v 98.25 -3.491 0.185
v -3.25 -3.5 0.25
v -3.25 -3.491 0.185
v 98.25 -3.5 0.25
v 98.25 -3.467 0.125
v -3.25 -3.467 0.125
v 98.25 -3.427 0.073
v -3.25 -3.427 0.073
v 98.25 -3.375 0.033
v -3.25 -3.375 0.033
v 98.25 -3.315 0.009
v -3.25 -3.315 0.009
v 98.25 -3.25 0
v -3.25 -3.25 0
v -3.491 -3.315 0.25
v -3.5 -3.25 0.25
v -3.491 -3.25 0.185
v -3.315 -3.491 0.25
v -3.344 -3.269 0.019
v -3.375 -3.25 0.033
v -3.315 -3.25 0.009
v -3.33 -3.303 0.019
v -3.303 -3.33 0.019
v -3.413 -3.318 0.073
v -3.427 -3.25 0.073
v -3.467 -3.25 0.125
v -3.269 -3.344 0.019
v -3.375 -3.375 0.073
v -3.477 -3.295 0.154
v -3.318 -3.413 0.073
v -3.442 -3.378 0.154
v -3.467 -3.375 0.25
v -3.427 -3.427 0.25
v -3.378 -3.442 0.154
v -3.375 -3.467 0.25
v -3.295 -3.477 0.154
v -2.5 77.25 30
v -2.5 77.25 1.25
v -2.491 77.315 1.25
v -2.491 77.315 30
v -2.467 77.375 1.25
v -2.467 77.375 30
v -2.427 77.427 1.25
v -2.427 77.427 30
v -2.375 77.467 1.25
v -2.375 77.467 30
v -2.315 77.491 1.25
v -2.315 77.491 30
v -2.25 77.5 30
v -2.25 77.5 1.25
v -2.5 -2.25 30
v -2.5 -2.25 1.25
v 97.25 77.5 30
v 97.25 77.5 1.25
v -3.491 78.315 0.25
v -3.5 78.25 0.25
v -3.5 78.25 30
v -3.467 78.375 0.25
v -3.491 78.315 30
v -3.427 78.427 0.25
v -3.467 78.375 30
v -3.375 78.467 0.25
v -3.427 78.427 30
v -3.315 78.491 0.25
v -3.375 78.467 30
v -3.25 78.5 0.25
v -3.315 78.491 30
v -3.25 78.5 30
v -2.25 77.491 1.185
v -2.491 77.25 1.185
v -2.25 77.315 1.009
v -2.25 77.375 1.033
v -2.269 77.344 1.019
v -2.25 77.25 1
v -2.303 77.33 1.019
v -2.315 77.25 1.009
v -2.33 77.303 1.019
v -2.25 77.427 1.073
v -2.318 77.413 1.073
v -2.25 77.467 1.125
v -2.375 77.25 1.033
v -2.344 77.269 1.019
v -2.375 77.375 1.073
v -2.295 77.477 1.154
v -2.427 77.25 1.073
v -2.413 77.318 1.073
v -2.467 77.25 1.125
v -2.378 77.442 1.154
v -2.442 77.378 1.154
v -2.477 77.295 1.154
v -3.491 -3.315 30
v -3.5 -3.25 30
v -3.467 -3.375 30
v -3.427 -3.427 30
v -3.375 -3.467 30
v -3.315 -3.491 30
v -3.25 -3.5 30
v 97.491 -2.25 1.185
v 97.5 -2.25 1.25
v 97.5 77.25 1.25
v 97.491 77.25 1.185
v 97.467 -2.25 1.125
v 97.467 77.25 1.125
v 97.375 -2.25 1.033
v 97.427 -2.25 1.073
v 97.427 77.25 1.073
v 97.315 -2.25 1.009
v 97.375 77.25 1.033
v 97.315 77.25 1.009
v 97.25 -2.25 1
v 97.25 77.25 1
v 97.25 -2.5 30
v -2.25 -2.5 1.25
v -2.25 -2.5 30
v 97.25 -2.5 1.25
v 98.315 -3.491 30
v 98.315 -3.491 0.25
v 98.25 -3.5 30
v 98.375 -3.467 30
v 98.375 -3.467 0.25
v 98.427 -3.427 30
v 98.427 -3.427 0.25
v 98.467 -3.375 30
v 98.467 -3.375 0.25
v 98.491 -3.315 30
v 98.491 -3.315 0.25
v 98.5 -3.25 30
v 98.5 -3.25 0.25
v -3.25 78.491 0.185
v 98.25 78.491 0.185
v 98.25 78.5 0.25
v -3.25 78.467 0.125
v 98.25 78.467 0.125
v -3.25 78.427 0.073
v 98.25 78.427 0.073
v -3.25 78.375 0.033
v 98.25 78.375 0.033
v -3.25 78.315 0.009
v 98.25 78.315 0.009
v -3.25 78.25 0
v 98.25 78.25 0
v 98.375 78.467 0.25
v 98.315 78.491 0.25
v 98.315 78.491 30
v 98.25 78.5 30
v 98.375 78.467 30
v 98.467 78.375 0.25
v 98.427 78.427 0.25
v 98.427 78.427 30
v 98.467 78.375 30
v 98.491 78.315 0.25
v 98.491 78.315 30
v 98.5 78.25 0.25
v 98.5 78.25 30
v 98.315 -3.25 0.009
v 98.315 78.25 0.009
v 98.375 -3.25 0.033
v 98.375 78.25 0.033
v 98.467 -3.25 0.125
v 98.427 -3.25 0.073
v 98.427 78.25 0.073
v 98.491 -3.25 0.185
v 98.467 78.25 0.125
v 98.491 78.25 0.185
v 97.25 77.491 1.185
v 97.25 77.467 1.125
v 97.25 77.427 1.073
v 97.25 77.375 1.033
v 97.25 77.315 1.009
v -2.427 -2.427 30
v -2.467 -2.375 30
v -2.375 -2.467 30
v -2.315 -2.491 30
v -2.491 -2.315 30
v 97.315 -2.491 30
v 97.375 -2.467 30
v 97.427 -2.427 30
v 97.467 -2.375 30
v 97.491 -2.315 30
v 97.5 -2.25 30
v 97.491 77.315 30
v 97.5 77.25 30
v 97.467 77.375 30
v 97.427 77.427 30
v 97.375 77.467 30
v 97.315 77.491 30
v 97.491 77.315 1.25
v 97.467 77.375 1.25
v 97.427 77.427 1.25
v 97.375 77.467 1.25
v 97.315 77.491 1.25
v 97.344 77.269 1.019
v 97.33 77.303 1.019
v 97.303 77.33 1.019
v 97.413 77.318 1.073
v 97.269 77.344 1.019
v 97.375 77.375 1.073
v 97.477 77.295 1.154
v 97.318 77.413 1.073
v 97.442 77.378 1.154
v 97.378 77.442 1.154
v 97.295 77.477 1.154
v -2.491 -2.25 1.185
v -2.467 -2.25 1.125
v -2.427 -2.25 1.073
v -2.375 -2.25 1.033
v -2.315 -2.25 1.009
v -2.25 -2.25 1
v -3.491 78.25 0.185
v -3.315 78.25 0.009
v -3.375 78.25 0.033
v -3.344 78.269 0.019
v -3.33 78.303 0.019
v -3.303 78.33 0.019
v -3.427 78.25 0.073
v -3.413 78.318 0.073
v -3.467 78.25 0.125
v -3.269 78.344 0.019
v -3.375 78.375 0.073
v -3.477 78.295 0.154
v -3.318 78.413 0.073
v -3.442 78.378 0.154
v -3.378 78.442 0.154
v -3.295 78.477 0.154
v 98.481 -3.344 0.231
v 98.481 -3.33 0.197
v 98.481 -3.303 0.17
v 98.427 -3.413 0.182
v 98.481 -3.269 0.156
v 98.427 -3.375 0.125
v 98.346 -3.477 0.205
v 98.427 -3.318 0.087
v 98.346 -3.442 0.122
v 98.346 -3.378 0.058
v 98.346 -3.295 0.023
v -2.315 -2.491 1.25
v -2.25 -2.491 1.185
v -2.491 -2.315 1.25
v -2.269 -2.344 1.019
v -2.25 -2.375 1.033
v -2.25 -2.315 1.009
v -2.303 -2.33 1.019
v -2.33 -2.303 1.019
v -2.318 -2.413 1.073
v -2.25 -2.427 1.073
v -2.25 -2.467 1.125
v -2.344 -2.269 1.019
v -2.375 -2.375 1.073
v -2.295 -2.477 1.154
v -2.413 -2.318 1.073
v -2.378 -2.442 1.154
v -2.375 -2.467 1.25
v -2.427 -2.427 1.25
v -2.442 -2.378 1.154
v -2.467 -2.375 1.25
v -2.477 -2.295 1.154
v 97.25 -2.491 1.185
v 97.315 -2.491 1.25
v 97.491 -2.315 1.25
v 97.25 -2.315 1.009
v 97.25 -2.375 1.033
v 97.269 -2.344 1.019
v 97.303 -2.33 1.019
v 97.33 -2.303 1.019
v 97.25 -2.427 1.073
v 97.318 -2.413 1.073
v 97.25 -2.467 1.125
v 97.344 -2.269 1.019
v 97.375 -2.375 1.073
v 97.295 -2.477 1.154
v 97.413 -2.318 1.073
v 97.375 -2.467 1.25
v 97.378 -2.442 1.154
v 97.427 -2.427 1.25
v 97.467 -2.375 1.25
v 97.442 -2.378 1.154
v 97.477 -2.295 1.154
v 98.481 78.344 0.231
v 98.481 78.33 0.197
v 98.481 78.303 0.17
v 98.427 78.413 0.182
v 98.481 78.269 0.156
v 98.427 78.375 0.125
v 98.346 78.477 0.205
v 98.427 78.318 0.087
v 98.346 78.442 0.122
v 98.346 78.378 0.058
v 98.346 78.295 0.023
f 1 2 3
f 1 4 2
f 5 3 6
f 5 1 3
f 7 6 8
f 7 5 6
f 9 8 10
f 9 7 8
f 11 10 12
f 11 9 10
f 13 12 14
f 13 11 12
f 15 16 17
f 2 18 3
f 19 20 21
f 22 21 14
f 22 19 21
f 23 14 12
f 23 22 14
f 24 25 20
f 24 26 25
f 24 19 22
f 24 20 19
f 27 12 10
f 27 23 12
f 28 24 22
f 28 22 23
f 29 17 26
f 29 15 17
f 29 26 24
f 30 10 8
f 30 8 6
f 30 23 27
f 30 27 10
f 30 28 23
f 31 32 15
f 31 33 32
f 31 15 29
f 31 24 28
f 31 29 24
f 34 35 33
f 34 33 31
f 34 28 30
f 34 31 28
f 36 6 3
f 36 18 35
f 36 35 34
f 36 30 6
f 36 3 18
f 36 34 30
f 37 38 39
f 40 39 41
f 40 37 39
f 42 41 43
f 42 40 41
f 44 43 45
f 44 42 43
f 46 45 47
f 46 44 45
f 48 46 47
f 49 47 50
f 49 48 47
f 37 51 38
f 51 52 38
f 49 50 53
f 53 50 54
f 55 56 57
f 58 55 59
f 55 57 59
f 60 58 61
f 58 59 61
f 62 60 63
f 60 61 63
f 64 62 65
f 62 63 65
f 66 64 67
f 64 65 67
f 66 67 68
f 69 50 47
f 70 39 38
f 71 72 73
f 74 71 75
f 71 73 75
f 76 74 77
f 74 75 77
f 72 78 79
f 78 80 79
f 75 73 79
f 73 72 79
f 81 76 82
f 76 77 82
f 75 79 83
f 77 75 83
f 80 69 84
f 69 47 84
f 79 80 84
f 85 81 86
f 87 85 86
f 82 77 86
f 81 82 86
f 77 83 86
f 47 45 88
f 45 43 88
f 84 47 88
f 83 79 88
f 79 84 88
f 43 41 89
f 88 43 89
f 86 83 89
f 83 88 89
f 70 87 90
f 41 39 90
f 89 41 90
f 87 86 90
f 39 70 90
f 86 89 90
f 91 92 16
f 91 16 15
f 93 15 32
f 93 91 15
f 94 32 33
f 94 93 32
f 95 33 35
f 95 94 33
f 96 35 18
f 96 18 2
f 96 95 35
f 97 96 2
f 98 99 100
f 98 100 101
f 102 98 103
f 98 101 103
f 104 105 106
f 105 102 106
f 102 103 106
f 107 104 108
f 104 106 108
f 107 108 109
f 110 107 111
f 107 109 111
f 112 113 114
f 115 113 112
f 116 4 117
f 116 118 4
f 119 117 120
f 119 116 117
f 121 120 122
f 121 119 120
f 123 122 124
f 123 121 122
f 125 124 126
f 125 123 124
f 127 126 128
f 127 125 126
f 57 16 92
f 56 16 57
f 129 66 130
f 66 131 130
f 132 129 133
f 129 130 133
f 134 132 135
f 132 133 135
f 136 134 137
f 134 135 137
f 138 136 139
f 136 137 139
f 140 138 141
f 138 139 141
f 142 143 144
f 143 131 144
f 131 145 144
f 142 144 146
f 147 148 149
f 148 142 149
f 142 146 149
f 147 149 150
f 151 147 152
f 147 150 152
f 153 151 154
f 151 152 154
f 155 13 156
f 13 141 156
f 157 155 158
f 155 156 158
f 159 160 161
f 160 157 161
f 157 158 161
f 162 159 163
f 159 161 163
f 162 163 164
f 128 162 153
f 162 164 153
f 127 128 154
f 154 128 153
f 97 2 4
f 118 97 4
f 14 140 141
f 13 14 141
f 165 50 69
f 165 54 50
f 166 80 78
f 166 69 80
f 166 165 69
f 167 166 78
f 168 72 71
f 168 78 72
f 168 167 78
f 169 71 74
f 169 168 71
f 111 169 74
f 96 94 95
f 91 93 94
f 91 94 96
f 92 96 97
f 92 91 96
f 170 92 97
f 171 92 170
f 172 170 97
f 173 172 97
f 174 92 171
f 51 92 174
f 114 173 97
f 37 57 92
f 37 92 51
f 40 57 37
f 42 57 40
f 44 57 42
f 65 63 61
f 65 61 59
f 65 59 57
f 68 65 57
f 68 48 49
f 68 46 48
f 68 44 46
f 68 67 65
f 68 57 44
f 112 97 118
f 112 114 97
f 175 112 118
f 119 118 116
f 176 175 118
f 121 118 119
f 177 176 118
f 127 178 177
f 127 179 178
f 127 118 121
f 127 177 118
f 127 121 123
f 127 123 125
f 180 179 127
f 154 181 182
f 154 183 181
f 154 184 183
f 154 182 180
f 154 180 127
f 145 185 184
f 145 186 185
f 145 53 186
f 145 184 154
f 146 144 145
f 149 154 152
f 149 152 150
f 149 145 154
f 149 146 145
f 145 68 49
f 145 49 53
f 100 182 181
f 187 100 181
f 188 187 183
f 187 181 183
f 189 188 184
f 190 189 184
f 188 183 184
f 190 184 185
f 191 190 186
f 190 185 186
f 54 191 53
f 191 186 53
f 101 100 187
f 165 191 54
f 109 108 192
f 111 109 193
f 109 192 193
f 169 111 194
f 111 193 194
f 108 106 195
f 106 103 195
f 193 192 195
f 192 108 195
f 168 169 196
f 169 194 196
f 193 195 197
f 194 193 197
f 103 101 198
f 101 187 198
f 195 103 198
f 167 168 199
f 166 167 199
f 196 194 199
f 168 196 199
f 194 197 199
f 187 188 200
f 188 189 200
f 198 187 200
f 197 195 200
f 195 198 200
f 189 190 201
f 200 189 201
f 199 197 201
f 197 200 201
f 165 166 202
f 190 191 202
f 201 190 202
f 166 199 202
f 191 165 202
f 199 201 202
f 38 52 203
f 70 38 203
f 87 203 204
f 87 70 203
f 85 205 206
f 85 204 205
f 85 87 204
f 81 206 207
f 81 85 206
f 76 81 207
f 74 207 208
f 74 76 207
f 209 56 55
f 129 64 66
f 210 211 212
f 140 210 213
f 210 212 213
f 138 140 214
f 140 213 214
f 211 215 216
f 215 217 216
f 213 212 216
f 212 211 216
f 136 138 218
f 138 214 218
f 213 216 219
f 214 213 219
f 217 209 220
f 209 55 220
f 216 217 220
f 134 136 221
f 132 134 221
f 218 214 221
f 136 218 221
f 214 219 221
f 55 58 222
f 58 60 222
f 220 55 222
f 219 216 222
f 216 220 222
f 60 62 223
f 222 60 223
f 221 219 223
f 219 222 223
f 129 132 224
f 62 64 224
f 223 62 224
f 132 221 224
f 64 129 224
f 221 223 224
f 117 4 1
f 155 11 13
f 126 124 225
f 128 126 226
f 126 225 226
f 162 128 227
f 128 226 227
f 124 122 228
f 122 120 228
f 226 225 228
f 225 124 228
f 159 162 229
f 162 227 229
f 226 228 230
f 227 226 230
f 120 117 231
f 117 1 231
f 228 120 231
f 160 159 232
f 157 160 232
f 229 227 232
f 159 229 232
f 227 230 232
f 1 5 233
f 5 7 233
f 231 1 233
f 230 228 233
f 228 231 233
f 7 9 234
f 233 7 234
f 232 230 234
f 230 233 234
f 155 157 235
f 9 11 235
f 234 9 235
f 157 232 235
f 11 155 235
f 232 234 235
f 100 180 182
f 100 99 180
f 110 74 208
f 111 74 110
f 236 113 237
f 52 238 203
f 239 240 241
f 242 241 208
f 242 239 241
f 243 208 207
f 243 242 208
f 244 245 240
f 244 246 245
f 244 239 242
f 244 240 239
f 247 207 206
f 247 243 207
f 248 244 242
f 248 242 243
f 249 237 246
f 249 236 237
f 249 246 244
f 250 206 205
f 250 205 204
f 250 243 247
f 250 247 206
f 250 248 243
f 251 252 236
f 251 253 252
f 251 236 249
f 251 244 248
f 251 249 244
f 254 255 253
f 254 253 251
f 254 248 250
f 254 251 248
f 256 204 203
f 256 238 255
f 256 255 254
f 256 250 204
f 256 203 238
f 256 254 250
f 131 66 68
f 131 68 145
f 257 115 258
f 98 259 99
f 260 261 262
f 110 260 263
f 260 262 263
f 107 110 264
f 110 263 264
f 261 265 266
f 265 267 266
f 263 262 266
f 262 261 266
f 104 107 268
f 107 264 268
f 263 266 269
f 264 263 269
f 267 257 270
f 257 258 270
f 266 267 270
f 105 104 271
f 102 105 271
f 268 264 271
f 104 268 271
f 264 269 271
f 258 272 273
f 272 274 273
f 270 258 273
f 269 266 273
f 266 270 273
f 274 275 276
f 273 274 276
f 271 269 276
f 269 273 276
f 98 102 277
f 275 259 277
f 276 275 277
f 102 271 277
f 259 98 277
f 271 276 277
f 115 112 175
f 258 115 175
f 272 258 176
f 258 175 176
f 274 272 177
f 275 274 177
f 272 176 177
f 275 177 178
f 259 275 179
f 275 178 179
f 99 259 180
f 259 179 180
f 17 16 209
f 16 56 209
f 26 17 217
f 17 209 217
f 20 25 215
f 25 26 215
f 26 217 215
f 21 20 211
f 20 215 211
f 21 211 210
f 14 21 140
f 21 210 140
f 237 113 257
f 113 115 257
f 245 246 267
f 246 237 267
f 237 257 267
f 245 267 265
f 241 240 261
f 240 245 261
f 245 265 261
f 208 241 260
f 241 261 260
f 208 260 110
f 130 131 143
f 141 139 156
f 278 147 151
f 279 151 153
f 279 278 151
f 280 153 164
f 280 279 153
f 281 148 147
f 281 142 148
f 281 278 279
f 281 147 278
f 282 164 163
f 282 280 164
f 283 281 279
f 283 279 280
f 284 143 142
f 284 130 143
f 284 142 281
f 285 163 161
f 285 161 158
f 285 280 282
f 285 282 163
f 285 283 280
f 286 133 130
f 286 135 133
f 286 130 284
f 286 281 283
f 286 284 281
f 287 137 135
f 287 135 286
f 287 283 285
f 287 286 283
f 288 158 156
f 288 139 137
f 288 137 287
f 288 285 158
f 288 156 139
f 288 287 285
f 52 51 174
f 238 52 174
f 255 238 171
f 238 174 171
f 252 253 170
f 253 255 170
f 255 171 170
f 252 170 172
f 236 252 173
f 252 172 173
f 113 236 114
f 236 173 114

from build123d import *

# Parameters (mm, degrees)
BOX002_W     = 110
BOX002_H     = 100
BOX002_DEPTH = 20
BOX001_W     = 100
BOX001_H     = 80
BOX001_DEPTH = 50
BOX_W        = 102
BOX_H        = 82
BOX_DEPTH    = 50
FILLET_R     = 0.25


with BuildPart() as cube002:
    # Box002 → Box002 (new body)
    with BuildSketch(Plane(origin=(-10, -10, 30), x_dir=(1, 0, 0), z_dir=(0, 0, 1))):
        with Locations((55, 50)):
            Rectangle(BOX002_W, BOX002_H)
    extrude(amount=BOX002_DEPTH)


with BuildPart() as cube001:
    # Box001 → Box001 (new body)
    with BuildSketch(Plane(origin=(1, 1, 1), x_dir=(1, 0, 0), z_dir=(0, 0, 1))):
        with Locations((50, 40)):
            Rectangle(BOX001_W, BOX001_H)
    extrude(amount=BOX001_DEPTH)


with BuildPart() as box:
    # Box → Box (new body)
    with BuildSketch(Plane.XY):
        with Locations((51, 41)):
            Rectangle(BOX_W, BOX_H)
    extrude(amount=BOX_DEPTH)

    # Cut: cut Cube001
    add(cube001.part, mode=Mode.SUBTRACT)

    # Fillet
    fillet_edges = [box.edges().sort_by_distance(p)[0] for p in [
        (0, 0, 25),
        (0, 41, 50),
        (0, 82, 25),
        (0, 41, 0),
        (51, 0, 0),
        (102, 0, 25),
        (51, 0, 50),
        (51, 82, 50),
        (102, 41, 50),
        (51, 1, 50),
        (101, 41, 50),
        (51, 81, 50),
        (1, 41, 50),
        (51, 82, 0),
        (102, 82, 25),
        (102, 41, 0),
        (101, 1, 25.5),
        (1, 1, 25.5),
        (51, 1, 1),
        (101, 81, 25.5),
        (101, 41, 1),
        (1, 81, 25.5),
        (51, 81, 1),
        (1, 41, 1),
    ]]
    fillet(fillet_edges, radius=FILLET_R)


with BuildPart() as box_1:
    # Fillet placement: moved
    add(box.part.moved(Location((-3.5, -3.5, 0))))

    # Cut005: cut Cube002
    add(cube002.part, mode=Mode.SUBTRACT)


solid = box_1.part
